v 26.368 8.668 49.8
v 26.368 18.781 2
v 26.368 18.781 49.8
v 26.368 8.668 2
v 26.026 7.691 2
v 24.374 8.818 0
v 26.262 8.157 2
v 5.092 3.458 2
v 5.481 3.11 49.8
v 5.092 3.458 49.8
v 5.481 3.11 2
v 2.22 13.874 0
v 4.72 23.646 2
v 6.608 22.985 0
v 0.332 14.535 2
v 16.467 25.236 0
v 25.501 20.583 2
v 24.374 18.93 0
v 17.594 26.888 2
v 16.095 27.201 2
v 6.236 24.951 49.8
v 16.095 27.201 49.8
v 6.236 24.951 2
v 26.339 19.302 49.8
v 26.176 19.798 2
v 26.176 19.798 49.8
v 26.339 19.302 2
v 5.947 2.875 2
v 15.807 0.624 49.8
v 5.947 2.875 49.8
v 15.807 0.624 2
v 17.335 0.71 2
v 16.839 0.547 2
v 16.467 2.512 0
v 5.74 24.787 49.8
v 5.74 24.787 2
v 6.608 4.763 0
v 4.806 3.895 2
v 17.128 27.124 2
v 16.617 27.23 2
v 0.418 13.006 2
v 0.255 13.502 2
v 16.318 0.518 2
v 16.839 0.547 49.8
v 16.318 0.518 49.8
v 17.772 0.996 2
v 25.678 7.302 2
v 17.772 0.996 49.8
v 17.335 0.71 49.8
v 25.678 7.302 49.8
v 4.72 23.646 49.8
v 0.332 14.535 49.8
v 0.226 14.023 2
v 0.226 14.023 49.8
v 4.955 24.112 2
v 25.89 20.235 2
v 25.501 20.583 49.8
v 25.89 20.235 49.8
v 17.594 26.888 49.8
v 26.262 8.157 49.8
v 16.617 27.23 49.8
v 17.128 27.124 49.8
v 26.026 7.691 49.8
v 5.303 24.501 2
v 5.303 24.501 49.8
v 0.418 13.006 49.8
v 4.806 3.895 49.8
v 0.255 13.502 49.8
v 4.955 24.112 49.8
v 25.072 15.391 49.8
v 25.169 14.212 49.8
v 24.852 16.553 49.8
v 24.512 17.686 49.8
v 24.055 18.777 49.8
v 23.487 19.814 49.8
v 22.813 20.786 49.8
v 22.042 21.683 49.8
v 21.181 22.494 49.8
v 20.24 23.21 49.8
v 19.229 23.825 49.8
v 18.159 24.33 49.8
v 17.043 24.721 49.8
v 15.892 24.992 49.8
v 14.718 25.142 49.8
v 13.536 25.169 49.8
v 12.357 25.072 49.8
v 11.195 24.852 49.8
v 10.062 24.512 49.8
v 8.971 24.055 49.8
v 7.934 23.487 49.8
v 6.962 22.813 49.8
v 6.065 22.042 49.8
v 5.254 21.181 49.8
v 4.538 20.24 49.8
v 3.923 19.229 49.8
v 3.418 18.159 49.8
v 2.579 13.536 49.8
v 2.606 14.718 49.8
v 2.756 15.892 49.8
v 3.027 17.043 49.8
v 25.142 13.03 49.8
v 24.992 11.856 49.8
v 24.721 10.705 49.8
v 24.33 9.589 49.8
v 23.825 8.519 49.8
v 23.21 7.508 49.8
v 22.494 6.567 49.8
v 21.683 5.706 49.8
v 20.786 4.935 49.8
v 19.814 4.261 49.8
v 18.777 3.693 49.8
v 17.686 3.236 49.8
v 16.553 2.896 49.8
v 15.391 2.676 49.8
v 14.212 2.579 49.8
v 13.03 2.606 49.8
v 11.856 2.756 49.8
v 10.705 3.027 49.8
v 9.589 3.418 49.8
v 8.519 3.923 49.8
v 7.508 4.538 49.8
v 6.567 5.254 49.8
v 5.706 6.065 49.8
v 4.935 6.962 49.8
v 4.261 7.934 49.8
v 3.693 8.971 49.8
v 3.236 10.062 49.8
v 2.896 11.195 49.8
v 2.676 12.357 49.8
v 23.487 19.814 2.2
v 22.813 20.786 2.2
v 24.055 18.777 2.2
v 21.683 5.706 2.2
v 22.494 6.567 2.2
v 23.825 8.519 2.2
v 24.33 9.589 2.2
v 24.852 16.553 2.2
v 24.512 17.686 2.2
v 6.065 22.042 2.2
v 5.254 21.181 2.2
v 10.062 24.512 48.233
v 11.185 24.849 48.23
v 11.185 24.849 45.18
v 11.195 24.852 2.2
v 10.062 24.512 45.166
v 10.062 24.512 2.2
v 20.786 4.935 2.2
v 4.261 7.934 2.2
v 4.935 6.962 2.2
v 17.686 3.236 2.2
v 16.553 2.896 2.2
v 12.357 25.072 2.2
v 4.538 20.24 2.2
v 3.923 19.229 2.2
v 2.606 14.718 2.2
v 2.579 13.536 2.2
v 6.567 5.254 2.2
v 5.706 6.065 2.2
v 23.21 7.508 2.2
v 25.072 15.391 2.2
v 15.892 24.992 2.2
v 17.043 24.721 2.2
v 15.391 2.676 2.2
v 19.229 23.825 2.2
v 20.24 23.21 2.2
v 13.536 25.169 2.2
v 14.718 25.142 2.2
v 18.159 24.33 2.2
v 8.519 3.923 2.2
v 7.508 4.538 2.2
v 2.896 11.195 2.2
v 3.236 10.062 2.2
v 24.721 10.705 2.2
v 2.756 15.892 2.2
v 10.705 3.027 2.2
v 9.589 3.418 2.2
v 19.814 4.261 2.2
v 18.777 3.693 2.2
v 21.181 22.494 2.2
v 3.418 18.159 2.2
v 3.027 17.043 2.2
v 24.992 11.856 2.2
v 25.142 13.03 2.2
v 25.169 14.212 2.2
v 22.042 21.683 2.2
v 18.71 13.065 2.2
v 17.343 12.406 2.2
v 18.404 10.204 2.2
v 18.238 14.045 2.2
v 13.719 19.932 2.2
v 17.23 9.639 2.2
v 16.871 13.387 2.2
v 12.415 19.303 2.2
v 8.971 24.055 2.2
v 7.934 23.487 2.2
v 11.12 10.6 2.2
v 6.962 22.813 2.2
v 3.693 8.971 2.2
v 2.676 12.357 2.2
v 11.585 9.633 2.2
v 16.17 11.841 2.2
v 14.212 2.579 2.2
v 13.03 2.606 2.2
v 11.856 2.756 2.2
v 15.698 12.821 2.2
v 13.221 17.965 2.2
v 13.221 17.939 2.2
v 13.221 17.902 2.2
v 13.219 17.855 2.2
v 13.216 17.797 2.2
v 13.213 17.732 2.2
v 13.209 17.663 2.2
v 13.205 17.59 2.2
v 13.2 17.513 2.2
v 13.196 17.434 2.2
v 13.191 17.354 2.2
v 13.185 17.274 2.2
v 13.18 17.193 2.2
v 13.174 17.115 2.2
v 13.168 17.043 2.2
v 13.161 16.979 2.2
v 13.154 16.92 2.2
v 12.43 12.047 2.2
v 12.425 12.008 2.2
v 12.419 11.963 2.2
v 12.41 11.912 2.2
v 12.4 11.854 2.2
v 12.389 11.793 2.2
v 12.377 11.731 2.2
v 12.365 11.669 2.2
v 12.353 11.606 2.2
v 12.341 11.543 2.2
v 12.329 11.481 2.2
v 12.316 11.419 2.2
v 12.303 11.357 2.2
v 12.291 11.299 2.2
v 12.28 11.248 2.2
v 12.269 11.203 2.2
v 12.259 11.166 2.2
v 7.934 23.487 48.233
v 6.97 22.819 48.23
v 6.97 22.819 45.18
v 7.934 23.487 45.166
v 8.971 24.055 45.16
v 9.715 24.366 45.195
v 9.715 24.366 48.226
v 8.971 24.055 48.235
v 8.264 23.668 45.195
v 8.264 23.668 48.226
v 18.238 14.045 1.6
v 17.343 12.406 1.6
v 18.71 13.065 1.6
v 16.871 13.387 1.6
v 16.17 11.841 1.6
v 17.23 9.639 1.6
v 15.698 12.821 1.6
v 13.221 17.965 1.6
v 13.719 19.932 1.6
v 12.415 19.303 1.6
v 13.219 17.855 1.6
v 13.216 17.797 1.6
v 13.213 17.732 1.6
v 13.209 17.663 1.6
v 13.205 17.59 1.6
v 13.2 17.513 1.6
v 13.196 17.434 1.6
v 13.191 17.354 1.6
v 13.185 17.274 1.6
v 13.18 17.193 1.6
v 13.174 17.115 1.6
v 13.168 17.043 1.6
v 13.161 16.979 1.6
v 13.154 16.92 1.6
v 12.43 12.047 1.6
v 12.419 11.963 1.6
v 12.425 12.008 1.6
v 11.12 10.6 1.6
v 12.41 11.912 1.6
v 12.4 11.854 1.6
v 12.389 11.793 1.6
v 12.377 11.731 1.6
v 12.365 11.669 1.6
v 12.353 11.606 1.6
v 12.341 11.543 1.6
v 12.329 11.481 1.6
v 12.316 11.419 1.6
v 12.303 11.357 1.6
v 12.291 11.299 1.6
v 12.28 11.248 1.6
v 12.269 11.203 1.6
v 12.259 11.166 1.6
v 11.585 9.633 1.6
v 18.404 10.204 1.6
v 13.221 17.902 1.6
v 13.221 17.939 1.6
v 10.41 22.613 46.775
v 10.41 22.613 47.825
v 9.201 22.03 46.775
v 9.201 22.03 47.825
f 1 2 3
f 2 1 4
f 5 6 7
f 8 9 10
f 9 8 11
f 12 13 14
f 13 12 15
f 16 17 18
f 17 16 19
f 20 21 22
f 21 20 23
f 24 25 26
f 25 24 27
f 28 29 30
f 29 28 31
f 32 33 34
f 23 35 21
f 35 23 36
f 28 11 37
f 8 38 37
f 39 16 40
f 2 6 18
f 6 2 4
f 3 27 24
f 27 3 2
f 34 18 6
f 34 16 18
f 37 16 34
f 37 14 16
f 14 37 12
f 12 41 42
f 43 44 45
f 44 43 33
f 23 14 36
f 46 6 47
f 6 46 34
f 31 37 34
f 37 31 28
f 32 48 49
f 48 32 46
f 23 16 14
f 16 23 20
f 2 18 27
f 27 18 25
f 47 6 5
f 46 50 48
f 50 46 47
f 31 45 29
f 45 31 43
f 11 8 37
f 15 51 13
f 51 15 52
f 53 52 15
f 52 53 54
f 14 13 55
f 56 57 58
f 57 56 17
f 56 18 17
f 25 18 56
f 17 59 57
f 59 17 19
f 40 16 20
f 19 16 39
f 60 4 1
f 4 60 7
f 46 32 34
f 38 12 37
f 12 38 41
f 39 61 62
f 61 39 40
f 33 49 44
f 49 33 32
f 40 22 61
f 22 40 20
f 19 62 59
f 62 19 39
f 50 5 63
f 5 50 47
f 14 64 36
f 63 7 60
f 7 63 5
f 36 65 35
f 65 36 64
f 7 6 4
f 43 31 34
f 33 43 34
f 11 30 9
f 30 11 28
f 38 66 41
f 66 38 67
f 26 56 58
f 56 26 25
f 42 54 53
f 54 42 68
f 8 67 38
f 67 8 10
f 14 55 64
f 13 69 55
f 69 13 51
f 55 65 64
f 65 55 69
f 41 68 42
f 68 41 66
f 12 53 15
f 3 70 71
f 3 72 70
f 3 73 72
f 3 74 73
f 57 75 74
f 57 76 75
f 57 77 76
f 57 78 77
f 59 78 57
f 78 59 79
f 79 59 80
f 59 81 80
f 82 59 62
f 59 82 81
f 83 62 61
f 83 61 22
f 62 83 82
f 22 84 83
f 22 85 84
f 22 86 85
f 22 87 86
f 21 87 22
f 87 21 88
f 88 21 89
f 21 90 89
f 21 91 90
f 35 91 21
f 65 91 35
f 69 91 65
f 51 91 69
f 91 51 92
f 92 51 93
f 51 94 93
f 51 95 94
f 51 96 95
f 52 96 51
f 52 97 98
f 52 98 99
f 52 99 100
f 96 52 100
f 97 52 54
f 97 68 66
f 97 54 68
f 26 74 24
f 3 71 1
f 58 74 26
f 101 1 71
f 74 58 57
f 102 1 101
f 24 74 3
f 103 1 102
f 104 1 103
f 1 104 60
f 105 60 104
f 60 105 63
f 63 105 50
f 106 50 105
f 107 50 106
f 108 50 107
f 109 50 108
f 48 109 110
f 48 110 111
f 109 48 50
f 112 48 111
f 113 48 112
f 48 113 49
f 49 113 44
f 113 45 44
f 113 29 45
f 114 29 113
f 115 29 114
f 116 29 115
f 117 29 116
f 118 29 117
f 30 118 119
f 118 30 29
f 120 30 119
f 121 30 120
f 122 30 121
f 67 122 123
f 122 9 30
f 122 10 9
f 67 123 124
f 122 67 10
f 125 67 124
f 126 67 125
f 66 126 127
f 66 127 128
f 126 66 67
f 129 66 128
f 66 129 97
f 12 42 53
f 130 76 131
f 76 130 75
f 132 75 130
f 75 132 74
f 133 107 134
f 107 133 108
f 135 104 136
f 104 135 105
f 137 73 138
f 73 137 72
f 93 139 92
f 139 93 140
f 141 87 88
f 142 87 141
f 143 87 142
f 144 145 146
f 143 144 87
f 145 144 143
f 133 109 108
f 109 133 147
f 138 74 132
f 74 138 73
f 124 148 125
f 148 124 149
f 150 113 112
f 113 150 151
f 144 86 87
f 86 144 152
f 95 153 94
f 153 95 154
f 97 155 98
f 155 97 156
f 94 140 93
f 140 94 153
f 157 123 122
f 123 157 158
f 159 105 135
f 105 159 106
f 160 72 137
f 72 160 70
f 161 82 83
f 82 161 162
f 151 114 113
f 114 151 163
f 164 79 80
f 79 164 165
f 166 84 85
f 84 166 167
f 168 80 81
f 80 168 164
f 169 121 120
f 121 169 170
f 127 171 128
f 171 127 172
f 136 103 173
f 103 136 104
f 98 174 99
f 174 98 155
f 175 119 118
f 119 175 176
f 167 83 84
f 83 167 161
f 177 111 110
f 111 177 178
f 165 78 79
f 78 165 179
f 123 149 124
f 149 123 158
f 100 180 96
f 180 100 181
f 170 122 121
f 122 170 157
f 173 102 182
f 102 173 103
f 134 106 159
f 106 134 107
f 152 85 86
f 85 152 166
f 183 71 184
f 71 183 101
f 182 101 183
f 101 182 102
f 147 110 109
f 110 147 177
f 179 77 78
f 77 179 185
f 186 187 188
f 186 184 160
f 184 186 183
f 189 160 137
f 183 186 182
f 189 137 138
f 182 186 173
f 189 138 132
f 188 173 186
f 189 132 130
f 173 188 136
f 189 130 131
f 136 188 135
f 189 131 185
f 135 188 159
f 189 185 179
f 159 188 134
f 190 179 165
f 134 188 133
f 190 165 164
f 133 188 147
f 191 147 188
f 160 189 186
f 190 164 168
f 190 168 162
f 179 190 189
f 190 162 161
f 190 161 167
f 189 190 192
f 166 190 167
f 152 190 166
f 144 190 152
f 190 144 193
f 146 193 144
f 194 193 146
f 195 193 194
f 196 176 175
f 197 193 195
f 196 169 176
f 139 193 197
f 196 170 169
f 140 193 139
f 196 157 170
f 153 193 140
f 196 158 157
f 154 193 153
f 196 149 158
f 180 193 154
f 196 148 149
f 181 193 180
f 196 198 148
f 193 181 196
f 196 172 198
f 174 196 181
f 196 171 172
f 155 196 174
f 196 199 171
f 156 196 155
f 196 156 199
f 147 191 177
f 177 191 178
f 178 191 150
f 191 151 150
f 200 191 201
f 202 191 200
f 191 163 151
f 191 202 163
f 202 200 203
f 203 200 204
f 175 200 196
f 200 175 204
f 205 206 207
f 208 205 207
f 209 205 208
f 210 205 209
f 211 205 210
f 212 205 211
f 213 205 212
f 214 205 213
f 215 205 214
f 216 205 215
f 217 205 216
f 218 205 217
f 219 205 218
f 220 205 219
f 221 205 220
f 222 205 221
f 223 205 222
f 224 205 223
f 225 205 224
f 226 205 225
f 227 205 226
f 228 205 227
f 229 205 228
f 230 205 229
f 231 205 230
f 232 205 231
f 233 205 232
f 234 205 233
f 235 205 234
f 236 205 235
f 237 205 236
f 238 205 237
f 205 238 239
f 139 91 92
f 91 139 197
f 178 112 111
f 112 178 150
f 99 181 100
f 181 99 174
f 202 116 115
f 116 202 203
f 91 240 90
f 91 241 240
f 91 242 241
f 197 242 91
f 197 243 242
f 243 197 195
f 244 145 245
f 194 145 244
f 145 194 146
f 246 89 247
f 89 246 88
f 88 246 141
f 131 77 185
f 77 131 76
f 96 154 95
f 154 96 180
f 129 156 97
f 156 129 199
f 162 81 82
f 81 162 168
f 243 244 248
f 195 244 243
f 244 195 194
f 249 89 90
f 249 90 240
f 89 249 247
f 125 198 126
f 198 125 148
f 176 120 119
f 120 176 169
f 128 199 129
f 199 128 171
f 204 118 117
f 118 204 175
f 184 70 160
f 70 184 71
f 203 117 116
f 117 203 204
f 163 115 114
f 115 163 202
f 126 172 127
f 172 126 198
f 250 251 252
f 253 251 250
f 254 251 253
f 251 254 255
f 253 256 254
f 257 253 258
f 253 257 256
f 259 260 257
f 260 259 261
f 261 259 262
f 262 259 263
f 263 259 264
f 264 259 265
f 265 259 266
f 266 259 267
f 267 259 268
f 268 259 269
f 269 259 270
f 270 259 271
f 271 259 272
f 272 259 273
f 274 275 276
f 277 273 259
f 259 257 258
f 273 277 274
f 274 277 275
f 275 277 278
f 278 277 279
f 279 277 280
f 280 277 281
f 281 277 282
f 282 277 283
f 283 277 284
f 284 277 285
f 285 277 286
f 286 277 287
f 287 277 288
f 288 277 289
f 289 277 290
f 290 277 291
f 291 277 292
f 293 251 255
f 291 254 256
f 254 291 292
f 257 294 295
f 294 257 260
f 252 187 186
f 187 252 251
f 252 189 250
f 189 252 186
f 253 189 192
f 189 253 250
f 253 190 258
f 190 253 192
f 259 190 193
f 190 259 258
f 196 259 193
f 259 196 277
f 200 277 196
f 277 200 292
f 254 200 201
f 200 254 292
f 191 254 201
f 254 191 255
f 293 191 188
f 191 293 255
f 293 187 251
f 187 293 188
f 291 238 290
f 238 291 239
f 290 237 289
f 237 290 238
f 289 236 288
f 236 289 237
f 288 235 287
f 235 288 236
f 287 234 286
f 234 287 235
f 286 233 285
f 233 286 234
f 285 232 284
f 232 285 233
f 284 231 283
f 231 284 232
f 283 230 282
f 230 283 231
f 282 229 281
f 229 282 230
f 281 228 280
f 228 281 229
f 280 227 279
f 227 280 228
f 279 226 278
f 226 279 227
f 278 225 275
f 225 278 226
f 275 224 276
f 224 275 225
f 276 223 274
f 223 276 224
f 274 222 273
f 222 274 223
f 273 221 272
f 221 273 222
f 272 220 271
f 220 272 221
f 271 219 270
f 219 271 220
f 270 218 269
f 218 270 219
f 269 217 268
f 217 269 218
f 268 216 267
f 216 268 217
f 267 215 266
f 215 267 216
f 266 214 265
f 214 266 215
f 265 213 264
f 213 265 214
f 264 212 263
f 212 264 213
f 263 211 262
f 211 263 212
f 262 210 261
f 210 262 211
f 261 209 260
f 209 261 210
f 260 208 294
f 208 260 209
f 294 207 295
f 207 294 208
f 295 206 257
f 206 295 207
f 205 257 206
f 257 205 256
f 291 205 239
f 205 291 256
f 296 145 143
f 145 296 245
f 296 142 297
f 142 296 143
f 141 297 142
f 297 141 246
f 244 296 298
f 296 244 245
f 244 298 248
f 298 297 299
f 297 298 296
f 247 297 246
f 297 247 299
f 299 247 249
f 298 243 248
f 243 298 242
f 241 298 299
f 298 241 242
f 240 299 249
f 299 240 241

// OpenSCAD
// Puzzlebox by RevK, @TheRealRevK www.me.uk
// Thingiverse examples and instructions https://www.thingiverse.com/thing:2410748
// GitHub source https://github.com/revk/PuzzleBox
// Get new random custom maze gift boxes from https://www.me.uk/puzzlebox
// Created 2023-08-08T09:46:12Z 185.232.140.140
// Total parts: m=2
// Part to make: n=2
// Nubs: N=1
// Base height: b=15
// Core diameter for content: c=16
// Core height for content: h=60
// Base thickness: B=1.6
// Base gap (Z clearance): G=0.4
// Wall thickness: w=1.2
// Maze thickness: t=2
// Maze spacing: z=5
// Maze top margin: M=1
// Maze complexity: X=4
// Thickness of park ridge to click closed: p=0.7
// General X/Y clearance: g=0.1
// Number of outer sides: s=7
// Outer rounding on ends: r=2
// Grip depth: R=2
// Text depth: D=0.5
// Text has diagonal edges (very slow): Z
// Scale side text (i.e. if too long): T=1
// Text (initials) inside end: I=4
// Logo (and inside text) cut depth: L=0.6
// Extra clearance on radius for nub: y=0.1
// Extra clearance on height of nub: Z=0.2
module cuttext(){translate([0,0,-1000])minkowski(){rotate([0,0,22.5])cylinder(h=500,d1=500,d2=0,$fn=8);linear_extrude(height=1000,convexity=10)mirror([1,0,0])children();}}
module outer(h,r){e=2000;minkowski(){cylinder(r1=0,r2=e,h=e,$fn=24);cylinder(h=h-e,r=r,$fn=7);}}
scale(0.001){
// Part 2 (11.30mm to 12.50mm and 12.50mm/13.87mm base)
translate([13874,13874,0])
rotate([0,0,25.714286]){
difference(){union(){difference(){
outer(49800,11654);
translate([0,0,2200])cylinder(r=11300,h=49800,$fn=60);
}
}
translate([0,0,1600])linear_extrude(height=1200,convexity=10)text("4",font="",size=11300,halign="center",valign="center");
}
rotate([0,0,0.000000])for(a=[0:360.000000:359])rotate([0,0,a])polyhedron(points=[[2423,11139,45100],[813,11371,45100],[-813,11371,45100],[-2423,11139,45100],[2423,11139,46775],[671,9376,46775],[-671,9376,46775],[-2423,11139,46775],[2423,11139,47825],[671,9376,47825],[-671,9376,47825],[-2423,11139,47825],[2423,11139,48250],[813,11371,48250],[-813,11371,48250],[-2423,11139,48250],[2423,11139,45100],[813,11371,45100],[-813,11371,45100],[-2423,11139,45100],[2423,11139,46775],[813,11371,46775],[-813,11371,46775],[-2423,11139,46775],[2423,11139,47825],[813,11371,47825],[-813,11371,47825],[-2423,11139,47825],[2423,11139,48250],[813,11371,48250],[-813,11371,48250],[-2423,11139,48250],],faces=[[20,21,17],[20,17,16],[21,22,18],[21,18,17],[22,23,19],[22,19,18],[24,25,21],[24,21,20],[25,26,22],[25,22,21],[26,27,23],[26,23,22],[28,29,25],[28,25,24],[29,30,26],[29,26,25],[30,31,27],[30,27,26],[4,20,16],[4,16,0],[23,7,3],[23,3,19],[8,24,20],[8,20,4],[27,11,7],[27,7,23],[12,28,24],[12,24,8],[31,15,11],[31,11,27],[28,12,13],[28,13,29],[0,16,17],[0,17,1],[29,13,14],[29,14,30],[1,17,18],[1,18,2],[30,14,15],[30,15,31],[2,18,19],[2,19,3],[0,1,5],[0,5,4],[4,5,9],[4,9,8],[8,9,12],[9,13,12],[1,2,6],[1,6,5],[5,6,10],[5,10,9],[9,10,14],[9,14,13],[2,3,6],[3,7,6],[6,7,11],[6,11,10],[10,11,15],[10,15,14],]);
}
}
